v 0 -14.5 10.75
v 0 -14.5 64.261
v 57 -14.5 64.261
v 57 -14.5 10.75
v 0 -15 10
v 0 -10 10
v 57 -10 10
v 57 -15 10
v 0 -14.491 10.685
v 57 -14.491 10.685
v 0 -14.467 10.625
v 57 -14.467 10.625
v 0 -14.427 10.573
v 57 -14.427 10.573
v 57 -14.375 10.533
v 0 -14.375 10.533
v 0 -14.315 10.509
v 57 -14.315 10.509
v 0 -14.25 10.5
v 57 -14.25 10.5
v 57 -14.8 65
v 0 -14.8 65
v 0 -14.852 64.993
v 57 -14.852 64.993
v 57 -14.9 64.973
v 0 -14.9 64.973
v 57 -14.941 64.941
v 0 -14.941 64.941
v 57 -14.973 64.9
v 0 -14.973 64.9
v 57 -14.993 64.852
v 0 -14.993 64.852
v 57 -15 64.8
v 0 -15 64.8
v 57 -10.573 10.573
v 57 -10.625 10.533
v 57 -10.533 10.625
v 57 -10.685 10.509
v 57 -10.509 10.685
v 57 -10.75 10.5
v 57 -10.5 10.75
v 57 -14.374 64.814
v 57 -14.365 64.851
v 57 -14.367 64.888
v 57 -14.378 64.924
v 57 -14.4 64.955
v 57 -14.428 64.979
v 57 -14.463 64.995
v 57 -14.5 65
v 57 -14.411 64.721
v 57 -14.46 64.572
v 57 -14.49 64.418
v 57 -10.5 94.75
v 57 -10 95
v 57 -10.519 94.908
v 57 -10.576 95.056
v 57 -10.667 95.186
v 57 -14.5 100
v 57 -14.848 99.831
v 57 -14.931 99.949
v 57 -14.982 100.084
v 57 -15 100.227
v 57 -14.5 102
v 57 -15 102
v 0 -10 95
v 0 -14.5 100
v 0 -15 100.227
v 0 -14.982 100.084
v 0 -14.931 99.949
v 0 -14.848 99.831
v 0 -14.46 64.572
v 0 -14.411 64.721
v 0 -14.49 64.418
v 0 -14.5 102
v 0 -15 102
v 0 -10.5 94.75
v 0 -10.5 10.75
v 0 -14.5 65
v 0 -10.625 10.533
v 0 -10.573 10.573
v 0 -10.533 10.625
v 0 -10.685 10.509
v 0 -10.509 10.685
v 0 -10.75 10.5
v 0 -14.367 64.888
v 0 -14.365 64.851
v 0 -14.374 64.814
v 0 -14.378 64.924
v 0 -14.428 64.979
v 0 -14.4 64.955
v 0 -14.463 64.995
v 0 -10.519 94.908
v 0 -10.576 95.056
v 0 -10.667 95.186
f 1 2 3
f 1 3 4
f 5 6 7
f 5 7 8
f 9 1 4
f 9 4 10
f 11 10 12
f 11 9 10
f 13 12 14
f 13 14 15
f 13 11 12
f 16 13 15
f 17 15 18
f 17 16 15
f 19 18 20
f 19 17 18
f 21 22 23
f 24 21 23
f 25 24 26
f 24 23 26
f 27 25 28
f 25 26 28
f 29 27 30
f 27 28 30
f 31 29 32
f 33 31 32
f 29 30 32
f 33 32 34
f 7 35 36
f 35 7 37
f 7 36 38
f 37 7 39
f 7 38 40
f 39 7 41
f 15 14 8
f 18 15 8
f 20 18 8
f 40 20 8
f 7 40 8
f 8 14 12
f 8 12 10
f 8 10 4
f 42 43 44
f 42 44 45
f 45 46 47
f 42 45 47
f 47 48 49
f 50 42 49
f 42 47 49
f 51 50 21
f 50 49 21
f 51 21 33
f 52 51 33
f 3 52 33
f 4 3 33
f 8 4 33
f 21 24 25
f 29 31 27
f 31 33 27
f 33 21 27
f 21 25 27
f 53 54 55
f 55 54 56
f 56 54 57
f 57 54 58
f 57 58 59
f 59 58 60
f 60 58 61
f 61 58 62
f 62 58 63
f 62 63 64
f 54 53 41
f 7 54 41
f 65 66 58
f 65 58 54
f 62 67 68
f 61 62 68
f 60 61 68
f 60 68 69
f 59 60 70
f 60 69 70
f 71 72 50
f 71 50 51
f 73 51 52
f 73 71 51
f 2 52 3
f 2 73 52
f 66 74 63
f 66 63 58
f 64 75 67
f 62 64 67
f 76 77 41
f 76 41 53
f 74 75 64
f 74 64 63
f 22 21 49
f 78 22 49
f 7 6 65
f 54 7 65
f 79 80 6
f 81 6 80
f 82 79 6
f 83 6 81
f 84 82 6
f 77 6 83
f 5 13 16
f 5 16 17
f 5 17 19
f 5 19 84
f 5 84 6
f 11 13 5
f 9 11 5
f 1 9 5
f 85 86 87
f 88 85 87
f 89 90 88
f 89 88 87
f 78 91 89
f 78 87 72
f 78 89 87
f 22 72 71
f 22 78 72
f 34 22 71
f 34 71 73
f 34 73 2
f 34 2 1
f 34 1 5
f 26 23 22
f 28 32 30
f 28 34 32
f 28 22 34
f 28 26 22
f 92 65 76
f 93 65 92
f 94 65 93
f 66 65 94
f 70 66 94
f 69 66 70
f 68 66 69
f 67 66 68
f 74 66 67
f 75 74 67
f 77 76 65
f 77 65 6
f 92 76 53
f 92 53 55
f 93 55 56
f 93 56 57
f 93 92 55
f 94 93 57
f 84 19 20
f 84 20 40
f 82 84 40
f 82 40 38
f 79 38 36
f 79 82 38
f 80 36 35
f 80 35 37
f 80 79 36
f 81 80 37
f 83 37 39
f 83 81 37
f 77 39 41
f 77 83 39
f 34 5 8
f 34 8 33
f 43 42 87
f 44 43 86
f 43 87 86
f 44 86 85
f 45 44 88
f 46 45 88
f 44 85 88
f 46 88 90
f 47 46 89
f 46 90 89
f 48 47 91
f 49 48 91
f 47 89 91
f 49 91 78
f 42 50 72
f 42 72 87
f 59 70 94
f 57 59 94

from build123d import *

# Parameters (mm, degrees)
PAD002_DEPTH = 57


with BuildPart() as part:
    # Sketch005 → Pad002 (new body)
    with BuildSketch(Plane.YZ):
        with BuildLine():
            Line((-10, 10), (-15, 10))
            Line((-15, 10), (-15, 64.8))
            ThreePointArc((-14.8, 65), (-14.941421, 64.941421), (-15, 64.8))
            Line((-14.8, 65), (-14.5, 65))
            ThreePointArc((-14.374278, 64.814305), (-14.387874, 64.940506), (-14.5, 65))
            Line((-14.411417, 64.721457), (-14.374278, 64.814305))
            ThreePointArc((-14.411417, 64.721457), (-14.477653, 64.495696), (-14.5, 64.261484))
            Line((-14.5, 64.261484), (-14.5, 10.75))
            ThreePointArc((-14.5, 10.75), (-14.426777, 10.573223), (-14.25, 10.5))
            Line((-14.25, 10.5), (-10.75, 10.5))
            ThreePointArc((-10.75, 10.5), (-10.573223, 10.573223), (-10.5, 10.75))
            Line((-10.5, 10.75), (-10.5, 94.75))
            ThreePointArc((-10.5, 94.75), (-10.543246, 94.983405), (-10.667241, 95.185824))
            Line((-14.848271, 99.831412), (-10.667241, 95.185824))
            ThreePointArc((-15, 100.226812), (-14.960766, 100.015056), (-14.848271, 99.831412))
            Line((-15, 102), (-15, 100.226812))
            Line((-15, 102), (-14.5, 102))
            Line((-14.5, 102), (-14.5, 100))
            Line((-14.5, 100), (-10, 95))
            Line((-10, 10), (-10, 95))
        make_face()
    extrude(amount=PAD002_DEPTH)


solid = part.part
